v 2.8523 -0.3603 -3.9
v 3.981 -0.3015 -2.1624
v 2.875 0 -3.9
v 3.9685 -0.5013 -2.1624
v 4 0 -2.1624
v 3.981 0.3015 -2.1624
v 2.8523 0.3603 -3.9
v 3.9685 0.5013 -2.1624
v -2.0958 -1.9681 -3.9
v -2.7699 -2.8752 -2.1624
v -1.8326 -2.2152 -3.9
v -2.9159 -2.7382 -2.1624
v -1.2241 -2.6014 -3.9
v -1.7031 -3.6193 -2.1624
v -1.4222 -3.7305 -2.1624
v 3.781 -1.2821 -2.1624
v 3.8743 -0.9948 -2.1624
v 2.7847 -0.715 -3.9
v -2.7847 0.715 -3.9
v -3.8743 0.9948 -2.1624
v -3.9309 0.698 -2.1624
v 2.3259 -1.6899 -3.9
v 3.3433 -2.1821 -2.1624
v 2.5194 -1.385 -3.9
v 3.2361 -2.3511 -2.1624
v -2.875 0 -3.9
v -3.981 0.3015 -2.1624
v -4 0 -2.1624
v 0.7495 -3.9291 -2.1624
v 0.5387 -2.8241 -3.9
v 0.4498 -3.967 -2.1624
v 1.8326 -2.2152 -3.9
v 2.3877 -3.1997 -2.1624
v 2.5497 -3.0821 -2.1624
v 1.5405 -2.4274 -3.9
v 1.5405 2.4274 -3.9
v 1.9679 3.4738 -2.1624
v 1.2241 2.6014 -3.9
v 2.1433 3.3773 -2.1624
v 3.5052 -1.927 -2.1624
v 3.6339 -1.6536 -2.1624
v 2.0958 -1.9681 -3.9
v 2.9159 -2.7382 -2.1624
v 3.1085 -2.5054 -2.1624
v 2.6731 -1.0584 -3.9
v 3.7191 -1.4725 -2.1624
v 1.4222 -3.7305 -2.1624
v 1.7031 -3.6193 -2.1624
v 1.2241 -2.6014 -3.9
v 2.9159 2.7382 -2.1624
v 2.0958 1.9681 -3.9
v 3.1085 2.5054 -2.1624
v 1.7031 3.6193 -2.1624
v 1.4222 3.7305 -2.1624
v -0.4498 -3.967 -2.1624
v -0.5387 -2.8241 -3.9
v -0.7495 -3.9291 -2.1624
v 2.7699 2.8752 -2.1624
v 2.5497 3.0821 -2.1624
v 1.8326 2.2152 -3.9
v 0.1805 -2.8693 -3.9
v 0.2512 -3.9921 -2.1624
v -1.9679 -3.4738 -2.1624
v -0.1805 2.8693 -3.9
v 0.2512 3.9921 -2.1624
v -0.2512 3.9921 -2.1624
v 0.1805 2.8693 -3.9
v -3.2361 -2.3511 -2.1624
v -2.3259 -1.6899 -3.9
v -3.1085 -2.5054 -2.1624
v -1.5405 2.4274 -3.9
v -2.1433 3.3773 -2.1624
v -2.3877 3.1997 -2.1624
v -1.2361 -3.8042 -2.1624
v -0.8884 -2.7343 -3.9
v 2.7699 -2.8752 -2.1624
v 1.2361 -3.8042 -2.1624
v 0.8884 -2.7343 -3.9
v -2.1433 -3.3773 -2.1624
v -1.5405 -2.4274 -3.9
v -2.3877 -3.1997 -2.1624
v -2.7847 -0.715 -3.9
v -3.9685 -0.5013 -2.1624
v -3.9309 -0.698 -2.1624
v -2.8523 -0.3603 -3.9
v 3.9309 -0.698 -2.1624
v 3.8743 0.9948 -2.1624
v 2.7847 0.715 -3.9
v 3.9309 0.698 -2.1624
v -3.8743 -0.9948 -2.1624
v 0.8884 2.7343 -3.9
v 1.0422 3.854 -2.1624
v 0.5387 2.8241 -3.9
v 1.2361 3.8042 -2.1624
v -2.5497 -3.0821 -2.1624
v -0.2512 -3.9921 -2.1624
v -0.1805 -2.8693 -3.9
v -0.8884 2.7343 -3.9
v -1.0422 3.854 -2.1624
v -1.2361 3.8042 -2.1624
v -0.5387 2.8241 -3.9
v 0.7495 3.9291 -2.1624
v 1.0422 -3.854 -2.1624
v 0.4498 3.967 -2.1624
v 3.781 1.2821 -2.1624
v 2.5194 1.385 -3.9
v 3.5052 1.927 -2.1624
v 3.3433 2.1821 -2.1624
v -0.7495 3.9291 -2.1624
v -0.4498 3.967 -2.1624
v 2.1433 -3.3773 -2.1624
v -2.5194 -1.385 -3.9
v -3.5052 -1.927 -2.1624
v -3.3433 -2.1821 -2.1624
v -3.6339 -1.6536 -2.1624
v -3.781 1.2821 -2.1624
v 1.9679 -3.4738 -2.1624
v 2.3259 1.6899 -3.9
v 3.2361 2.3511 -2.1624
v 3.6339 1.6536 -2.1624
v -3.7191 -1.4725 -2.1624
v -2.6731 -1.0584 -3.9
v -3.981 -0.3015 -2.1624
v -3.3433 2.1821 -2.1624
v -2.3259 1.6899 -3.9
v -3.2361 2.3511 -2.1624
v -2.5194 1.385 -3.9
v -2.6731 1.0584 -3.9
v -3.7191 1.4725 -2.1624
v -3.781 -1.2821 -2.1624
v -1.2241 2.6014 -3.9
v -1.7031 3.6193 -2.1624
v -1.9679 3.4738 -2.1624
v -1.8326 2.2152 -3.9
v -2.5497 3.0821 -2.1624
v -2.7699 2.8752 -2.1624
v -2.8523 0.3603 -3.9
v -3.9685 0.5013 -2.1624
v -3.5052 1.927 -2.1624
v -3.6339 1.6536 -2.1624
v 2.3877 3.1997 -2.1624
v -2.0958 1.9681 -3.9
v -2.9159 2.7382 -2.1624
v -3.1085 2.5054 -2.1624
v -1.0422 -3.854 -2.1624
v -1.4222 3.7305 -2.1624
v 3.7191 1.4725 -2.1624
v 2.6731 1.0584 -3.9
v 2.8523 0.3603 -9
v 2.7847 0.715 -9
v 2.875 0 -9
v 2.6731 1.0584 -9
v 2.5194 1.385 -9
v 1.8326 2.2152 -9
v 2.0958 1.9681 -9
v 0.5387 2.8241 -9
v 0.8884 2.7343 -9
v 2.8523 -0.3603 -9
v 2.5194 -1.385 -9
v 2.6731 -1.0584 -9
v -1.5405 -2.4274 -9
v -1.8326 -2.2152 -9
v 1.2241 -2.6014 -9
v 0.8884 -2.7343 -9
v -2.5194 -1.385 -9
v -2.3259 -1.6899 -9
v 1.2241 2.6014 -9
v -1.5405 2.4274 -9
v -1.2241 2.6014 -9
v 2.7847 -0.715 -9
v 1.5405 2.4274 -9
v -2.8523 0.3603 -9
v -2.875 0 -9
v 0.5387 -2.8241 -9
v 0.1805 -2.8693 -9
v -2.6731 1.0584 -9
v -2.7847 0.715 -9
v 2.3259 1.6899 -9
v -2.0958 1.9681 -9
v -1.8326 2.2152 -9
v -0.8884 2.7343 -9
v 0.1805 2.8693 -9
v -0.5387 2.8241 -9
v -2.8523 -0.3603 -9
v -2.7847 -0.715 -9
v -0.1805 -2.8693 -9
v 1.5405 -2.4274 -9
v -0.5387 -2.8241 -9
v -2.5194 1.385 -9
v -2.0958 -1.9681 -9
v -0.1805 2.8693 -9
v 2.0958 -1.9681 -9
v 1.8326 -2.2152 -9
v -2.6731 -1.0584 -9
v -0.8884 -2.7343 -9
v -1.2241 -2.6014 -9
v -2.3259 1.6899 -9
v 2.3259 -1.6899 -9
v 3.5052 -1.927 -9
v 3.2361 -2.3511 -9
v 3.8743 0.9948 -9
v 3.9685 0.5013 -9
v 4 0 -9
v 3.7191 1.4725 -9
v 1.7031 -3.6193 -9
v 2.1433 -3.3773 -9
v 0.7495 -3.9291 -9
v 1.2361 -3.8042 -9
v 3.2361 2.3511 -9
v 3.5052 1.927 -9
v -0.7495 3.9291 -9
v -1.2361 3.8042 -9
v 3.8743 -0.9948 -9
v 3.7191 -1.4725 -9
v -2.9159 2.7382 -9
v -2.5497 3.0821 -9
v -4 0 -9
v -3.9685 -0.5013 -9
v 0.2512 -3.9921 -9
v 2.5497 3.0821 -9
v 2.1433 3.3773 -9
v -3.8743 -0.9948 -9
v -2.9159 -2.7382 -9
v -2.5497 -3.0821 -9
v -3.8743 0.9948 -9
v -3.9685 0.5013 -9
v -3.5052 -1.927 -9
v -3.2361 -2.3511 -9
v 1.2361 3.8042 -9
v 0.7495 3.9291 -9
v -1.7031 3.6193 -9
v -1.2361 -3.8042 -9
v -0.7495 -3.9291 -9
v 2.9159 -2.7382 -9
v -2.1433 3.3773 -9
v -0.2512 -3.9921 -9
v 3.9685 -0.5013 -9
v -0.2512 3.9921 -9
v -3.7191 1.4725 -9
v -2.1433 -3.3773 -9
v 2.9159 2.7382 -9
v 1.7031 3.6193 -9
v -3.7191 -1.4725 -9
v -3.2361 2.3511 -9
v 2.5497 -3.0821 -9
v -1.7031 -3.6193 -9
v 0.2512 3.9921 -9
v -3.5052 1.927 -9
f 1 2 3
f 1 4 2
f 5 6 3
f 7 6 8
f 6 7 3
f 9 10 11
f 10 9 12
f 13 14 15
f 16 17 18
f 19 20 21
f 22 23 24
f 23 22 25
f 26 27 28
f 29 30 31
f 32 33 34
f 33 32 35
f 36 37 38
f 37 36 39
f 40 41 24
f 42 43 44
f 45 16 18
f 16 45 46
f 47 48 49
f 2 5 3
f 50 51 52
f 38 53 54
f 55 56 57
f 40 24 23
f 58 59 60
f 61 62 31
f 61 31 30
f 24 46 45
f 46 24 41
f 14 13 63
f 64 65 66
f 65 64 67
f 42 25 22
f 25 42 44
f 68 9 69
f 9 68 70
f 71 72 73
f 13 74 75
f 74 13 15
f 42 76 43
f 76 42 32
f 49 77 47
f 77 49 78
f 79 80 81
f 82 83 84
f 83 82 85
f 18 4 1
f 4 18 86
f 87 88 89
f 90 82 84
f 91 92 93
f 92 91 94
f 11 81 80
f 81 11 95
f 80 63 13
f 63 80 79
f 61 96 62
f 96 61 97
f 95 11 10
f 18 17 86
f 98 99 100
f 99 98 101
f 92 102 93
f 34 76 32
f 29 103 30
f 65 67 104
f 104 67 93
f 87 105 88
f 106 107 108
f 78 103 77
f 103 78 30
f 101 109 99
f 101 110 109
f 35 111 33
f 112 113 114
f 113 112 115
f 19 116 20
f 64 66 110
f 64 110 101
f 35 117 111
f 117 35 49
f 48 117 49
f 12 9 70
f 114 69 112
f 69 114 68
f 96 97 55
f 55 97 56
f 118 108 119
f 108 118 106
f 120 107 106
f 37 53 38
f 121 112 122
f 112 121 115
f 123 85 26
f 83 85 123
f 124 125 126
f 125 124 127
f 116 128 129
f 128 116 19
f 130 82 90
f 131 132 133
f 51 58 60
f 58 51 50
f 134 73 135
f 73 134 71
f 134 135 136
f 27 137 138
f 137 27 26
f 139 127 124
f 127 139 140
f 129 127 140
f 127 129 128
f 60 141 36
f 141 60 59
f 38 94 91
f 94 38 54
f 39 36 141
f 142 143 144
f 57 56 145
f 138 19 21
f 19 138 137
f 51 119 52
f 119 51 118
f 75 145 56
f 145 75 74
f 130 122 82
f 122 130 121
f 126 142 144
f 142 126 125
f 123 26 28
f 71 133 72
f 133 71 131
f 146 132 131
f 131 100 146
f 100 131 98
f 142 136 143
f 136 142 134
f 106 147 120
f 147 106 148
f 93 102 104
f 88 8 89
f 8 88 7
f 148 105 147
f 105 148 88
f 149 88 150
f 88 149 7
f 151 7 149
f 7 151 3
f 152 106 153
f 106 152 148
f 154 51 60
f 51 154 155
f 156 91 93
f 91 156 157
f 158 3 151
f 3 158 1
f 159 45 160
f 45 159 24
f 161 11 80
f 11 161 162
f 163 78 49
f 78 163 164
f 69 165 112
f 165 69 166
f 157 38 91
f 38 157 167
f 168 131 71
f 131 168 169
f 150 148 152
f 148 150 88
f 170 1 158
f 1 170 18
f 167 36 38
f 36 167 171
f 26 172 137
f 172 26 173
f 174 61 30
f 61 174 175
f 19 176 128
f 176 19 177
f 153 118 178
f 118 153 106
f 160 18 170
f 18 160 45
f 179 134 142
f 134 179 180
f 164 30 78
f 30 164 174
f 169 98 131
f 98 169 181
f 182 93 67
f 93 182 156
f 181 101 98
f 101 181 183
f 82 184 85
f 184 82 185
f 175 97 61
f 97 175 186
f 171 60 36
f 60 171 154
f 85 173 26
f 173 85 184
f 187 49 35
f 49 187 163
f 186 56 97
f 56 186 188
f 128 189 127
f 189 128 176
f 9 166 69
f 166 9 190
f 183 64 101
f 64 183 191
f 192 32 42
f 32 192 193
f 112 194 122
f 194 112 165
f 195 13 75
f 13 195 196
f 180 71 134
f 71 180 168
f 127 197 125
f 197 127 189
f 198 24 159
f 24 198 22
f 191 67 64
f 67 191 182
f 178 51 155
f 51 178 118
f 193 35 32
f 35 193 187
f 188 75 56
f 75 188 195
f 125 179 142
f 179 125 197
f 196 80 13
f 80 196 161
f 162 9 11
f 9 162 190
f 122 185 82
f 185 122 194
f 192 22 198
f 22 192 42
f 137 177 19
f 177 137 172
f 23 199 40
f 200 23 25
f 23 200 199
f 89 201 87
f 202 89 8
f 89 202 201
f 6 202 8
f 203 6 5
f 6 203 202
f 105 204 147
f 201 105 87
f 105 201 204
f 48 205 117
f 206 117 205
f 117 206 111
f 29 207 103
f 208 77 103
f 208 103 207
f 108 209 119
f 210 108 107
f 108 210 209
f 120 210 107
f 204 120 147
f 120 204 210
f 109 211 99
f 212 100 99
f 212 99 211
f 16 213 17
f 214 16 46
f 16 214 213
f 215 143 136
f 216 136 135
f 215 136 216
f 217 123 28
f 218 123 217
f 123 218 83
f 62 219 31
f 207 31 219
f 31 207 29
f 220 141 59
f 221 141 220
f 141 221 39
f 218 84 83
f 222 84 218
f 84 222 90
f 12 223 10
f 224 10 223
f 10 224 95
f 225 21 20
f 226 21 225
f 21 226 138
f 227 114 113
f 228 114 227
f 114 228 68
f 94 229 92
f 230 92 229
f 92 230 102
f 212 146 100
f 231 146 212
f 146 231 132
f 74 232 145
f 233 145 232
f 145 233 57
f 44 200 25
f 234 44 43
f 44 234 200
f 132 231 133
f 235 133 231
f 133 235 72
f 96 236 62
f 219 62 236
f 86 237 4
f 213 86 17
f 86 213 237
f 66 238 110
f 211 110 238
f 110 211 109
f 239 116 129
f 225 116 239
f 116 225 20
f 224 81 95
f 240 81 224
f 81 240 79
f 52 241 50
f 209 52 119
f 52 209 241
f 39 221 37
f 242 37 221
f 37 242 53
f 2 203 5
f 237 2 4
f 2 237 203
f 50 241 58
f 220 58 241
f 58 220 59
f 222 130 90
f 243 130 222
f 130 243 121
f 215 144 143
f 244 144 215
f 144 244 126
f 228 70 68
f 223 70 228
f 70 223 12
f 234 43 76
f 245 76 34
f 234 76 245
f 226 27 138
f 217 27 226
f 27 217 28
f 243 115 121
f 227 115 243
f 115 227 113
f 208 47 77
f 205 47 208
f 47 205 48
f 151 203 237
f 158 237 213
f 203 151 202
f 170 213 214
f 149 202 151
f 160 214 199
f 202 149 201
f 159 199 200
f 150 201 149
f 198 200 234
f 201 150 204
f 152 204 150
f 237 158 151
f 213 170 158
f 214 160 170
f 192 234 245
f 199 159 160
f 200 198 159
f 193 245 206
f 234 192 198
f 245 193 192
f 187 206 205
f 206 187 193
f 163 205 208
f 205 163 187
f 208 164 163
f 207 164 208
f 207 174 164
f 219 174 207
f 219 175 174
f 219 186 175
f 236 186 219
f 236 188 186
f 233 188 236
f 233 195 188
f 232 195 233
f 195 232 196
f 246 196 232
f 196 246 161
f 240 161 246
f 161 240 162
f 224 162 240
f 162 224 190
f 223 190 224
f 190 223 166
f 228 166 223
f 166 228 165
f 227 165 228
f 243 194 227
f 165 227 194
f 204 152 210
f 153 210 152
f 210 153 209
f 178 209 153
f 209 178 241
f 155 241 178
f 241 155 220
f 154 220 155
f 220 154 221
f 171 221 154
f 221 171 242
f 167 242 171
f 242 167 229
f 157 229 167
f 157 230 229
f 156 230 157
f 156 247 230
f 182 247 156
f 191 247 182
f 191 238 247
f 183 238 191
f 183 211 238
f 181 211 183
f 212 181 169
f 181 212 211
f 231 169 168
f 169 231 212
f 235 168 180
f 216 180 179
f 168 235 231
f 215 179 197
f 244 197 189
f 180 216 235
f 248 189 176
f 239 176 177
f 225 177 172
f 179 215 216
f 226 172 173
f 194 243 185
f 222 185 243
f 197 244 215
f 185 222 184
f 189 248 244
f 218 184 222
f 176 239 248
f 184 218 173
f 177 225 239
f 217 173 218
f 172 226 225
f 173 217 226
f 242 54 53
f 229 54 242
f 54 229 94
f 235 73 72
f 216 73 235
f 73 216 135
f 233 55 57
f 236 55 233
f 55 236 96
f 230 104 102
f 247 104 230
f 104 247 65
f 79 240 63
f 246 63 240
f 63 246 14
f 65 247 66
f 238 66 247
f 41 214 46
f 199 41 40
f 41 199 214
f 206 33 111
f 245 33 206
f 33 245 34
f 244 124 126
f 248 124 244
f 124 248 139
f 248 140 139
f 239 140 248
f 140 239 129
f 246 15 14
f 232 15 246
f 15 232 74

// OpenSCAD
$fn = 50;

difference() {
	union() {
		translate(v = [0, 0, -9.0]) {
			cylinder(h = 12, r = 4.0);
		}
	}
	union() {
		translate(v = [0, 0, 0]) {
			rotate(a = [0, 0, 0]) {
				difference() {
					union() {
						translate(v = [0, 0, -12.0]) {
							cylinder(h = 12, r = 2.6);
						}
						translate(v = [0, 0, -3.9]) {
							cylinder(h = 3.9, r1 = 2.875, r2 = 5.4);
						}
						translate(v = [0, 0, -12.0]) {
							cylinder(h = 12, r = 2.875);
						}
						translate(v = [0, 0, -12.0]) {
							cylinder(h = 12, r = 2.6);
						}
					}
					union();
				}
			}
		}
		#cylinder(h = 3, r = 5.0);
	}
}
